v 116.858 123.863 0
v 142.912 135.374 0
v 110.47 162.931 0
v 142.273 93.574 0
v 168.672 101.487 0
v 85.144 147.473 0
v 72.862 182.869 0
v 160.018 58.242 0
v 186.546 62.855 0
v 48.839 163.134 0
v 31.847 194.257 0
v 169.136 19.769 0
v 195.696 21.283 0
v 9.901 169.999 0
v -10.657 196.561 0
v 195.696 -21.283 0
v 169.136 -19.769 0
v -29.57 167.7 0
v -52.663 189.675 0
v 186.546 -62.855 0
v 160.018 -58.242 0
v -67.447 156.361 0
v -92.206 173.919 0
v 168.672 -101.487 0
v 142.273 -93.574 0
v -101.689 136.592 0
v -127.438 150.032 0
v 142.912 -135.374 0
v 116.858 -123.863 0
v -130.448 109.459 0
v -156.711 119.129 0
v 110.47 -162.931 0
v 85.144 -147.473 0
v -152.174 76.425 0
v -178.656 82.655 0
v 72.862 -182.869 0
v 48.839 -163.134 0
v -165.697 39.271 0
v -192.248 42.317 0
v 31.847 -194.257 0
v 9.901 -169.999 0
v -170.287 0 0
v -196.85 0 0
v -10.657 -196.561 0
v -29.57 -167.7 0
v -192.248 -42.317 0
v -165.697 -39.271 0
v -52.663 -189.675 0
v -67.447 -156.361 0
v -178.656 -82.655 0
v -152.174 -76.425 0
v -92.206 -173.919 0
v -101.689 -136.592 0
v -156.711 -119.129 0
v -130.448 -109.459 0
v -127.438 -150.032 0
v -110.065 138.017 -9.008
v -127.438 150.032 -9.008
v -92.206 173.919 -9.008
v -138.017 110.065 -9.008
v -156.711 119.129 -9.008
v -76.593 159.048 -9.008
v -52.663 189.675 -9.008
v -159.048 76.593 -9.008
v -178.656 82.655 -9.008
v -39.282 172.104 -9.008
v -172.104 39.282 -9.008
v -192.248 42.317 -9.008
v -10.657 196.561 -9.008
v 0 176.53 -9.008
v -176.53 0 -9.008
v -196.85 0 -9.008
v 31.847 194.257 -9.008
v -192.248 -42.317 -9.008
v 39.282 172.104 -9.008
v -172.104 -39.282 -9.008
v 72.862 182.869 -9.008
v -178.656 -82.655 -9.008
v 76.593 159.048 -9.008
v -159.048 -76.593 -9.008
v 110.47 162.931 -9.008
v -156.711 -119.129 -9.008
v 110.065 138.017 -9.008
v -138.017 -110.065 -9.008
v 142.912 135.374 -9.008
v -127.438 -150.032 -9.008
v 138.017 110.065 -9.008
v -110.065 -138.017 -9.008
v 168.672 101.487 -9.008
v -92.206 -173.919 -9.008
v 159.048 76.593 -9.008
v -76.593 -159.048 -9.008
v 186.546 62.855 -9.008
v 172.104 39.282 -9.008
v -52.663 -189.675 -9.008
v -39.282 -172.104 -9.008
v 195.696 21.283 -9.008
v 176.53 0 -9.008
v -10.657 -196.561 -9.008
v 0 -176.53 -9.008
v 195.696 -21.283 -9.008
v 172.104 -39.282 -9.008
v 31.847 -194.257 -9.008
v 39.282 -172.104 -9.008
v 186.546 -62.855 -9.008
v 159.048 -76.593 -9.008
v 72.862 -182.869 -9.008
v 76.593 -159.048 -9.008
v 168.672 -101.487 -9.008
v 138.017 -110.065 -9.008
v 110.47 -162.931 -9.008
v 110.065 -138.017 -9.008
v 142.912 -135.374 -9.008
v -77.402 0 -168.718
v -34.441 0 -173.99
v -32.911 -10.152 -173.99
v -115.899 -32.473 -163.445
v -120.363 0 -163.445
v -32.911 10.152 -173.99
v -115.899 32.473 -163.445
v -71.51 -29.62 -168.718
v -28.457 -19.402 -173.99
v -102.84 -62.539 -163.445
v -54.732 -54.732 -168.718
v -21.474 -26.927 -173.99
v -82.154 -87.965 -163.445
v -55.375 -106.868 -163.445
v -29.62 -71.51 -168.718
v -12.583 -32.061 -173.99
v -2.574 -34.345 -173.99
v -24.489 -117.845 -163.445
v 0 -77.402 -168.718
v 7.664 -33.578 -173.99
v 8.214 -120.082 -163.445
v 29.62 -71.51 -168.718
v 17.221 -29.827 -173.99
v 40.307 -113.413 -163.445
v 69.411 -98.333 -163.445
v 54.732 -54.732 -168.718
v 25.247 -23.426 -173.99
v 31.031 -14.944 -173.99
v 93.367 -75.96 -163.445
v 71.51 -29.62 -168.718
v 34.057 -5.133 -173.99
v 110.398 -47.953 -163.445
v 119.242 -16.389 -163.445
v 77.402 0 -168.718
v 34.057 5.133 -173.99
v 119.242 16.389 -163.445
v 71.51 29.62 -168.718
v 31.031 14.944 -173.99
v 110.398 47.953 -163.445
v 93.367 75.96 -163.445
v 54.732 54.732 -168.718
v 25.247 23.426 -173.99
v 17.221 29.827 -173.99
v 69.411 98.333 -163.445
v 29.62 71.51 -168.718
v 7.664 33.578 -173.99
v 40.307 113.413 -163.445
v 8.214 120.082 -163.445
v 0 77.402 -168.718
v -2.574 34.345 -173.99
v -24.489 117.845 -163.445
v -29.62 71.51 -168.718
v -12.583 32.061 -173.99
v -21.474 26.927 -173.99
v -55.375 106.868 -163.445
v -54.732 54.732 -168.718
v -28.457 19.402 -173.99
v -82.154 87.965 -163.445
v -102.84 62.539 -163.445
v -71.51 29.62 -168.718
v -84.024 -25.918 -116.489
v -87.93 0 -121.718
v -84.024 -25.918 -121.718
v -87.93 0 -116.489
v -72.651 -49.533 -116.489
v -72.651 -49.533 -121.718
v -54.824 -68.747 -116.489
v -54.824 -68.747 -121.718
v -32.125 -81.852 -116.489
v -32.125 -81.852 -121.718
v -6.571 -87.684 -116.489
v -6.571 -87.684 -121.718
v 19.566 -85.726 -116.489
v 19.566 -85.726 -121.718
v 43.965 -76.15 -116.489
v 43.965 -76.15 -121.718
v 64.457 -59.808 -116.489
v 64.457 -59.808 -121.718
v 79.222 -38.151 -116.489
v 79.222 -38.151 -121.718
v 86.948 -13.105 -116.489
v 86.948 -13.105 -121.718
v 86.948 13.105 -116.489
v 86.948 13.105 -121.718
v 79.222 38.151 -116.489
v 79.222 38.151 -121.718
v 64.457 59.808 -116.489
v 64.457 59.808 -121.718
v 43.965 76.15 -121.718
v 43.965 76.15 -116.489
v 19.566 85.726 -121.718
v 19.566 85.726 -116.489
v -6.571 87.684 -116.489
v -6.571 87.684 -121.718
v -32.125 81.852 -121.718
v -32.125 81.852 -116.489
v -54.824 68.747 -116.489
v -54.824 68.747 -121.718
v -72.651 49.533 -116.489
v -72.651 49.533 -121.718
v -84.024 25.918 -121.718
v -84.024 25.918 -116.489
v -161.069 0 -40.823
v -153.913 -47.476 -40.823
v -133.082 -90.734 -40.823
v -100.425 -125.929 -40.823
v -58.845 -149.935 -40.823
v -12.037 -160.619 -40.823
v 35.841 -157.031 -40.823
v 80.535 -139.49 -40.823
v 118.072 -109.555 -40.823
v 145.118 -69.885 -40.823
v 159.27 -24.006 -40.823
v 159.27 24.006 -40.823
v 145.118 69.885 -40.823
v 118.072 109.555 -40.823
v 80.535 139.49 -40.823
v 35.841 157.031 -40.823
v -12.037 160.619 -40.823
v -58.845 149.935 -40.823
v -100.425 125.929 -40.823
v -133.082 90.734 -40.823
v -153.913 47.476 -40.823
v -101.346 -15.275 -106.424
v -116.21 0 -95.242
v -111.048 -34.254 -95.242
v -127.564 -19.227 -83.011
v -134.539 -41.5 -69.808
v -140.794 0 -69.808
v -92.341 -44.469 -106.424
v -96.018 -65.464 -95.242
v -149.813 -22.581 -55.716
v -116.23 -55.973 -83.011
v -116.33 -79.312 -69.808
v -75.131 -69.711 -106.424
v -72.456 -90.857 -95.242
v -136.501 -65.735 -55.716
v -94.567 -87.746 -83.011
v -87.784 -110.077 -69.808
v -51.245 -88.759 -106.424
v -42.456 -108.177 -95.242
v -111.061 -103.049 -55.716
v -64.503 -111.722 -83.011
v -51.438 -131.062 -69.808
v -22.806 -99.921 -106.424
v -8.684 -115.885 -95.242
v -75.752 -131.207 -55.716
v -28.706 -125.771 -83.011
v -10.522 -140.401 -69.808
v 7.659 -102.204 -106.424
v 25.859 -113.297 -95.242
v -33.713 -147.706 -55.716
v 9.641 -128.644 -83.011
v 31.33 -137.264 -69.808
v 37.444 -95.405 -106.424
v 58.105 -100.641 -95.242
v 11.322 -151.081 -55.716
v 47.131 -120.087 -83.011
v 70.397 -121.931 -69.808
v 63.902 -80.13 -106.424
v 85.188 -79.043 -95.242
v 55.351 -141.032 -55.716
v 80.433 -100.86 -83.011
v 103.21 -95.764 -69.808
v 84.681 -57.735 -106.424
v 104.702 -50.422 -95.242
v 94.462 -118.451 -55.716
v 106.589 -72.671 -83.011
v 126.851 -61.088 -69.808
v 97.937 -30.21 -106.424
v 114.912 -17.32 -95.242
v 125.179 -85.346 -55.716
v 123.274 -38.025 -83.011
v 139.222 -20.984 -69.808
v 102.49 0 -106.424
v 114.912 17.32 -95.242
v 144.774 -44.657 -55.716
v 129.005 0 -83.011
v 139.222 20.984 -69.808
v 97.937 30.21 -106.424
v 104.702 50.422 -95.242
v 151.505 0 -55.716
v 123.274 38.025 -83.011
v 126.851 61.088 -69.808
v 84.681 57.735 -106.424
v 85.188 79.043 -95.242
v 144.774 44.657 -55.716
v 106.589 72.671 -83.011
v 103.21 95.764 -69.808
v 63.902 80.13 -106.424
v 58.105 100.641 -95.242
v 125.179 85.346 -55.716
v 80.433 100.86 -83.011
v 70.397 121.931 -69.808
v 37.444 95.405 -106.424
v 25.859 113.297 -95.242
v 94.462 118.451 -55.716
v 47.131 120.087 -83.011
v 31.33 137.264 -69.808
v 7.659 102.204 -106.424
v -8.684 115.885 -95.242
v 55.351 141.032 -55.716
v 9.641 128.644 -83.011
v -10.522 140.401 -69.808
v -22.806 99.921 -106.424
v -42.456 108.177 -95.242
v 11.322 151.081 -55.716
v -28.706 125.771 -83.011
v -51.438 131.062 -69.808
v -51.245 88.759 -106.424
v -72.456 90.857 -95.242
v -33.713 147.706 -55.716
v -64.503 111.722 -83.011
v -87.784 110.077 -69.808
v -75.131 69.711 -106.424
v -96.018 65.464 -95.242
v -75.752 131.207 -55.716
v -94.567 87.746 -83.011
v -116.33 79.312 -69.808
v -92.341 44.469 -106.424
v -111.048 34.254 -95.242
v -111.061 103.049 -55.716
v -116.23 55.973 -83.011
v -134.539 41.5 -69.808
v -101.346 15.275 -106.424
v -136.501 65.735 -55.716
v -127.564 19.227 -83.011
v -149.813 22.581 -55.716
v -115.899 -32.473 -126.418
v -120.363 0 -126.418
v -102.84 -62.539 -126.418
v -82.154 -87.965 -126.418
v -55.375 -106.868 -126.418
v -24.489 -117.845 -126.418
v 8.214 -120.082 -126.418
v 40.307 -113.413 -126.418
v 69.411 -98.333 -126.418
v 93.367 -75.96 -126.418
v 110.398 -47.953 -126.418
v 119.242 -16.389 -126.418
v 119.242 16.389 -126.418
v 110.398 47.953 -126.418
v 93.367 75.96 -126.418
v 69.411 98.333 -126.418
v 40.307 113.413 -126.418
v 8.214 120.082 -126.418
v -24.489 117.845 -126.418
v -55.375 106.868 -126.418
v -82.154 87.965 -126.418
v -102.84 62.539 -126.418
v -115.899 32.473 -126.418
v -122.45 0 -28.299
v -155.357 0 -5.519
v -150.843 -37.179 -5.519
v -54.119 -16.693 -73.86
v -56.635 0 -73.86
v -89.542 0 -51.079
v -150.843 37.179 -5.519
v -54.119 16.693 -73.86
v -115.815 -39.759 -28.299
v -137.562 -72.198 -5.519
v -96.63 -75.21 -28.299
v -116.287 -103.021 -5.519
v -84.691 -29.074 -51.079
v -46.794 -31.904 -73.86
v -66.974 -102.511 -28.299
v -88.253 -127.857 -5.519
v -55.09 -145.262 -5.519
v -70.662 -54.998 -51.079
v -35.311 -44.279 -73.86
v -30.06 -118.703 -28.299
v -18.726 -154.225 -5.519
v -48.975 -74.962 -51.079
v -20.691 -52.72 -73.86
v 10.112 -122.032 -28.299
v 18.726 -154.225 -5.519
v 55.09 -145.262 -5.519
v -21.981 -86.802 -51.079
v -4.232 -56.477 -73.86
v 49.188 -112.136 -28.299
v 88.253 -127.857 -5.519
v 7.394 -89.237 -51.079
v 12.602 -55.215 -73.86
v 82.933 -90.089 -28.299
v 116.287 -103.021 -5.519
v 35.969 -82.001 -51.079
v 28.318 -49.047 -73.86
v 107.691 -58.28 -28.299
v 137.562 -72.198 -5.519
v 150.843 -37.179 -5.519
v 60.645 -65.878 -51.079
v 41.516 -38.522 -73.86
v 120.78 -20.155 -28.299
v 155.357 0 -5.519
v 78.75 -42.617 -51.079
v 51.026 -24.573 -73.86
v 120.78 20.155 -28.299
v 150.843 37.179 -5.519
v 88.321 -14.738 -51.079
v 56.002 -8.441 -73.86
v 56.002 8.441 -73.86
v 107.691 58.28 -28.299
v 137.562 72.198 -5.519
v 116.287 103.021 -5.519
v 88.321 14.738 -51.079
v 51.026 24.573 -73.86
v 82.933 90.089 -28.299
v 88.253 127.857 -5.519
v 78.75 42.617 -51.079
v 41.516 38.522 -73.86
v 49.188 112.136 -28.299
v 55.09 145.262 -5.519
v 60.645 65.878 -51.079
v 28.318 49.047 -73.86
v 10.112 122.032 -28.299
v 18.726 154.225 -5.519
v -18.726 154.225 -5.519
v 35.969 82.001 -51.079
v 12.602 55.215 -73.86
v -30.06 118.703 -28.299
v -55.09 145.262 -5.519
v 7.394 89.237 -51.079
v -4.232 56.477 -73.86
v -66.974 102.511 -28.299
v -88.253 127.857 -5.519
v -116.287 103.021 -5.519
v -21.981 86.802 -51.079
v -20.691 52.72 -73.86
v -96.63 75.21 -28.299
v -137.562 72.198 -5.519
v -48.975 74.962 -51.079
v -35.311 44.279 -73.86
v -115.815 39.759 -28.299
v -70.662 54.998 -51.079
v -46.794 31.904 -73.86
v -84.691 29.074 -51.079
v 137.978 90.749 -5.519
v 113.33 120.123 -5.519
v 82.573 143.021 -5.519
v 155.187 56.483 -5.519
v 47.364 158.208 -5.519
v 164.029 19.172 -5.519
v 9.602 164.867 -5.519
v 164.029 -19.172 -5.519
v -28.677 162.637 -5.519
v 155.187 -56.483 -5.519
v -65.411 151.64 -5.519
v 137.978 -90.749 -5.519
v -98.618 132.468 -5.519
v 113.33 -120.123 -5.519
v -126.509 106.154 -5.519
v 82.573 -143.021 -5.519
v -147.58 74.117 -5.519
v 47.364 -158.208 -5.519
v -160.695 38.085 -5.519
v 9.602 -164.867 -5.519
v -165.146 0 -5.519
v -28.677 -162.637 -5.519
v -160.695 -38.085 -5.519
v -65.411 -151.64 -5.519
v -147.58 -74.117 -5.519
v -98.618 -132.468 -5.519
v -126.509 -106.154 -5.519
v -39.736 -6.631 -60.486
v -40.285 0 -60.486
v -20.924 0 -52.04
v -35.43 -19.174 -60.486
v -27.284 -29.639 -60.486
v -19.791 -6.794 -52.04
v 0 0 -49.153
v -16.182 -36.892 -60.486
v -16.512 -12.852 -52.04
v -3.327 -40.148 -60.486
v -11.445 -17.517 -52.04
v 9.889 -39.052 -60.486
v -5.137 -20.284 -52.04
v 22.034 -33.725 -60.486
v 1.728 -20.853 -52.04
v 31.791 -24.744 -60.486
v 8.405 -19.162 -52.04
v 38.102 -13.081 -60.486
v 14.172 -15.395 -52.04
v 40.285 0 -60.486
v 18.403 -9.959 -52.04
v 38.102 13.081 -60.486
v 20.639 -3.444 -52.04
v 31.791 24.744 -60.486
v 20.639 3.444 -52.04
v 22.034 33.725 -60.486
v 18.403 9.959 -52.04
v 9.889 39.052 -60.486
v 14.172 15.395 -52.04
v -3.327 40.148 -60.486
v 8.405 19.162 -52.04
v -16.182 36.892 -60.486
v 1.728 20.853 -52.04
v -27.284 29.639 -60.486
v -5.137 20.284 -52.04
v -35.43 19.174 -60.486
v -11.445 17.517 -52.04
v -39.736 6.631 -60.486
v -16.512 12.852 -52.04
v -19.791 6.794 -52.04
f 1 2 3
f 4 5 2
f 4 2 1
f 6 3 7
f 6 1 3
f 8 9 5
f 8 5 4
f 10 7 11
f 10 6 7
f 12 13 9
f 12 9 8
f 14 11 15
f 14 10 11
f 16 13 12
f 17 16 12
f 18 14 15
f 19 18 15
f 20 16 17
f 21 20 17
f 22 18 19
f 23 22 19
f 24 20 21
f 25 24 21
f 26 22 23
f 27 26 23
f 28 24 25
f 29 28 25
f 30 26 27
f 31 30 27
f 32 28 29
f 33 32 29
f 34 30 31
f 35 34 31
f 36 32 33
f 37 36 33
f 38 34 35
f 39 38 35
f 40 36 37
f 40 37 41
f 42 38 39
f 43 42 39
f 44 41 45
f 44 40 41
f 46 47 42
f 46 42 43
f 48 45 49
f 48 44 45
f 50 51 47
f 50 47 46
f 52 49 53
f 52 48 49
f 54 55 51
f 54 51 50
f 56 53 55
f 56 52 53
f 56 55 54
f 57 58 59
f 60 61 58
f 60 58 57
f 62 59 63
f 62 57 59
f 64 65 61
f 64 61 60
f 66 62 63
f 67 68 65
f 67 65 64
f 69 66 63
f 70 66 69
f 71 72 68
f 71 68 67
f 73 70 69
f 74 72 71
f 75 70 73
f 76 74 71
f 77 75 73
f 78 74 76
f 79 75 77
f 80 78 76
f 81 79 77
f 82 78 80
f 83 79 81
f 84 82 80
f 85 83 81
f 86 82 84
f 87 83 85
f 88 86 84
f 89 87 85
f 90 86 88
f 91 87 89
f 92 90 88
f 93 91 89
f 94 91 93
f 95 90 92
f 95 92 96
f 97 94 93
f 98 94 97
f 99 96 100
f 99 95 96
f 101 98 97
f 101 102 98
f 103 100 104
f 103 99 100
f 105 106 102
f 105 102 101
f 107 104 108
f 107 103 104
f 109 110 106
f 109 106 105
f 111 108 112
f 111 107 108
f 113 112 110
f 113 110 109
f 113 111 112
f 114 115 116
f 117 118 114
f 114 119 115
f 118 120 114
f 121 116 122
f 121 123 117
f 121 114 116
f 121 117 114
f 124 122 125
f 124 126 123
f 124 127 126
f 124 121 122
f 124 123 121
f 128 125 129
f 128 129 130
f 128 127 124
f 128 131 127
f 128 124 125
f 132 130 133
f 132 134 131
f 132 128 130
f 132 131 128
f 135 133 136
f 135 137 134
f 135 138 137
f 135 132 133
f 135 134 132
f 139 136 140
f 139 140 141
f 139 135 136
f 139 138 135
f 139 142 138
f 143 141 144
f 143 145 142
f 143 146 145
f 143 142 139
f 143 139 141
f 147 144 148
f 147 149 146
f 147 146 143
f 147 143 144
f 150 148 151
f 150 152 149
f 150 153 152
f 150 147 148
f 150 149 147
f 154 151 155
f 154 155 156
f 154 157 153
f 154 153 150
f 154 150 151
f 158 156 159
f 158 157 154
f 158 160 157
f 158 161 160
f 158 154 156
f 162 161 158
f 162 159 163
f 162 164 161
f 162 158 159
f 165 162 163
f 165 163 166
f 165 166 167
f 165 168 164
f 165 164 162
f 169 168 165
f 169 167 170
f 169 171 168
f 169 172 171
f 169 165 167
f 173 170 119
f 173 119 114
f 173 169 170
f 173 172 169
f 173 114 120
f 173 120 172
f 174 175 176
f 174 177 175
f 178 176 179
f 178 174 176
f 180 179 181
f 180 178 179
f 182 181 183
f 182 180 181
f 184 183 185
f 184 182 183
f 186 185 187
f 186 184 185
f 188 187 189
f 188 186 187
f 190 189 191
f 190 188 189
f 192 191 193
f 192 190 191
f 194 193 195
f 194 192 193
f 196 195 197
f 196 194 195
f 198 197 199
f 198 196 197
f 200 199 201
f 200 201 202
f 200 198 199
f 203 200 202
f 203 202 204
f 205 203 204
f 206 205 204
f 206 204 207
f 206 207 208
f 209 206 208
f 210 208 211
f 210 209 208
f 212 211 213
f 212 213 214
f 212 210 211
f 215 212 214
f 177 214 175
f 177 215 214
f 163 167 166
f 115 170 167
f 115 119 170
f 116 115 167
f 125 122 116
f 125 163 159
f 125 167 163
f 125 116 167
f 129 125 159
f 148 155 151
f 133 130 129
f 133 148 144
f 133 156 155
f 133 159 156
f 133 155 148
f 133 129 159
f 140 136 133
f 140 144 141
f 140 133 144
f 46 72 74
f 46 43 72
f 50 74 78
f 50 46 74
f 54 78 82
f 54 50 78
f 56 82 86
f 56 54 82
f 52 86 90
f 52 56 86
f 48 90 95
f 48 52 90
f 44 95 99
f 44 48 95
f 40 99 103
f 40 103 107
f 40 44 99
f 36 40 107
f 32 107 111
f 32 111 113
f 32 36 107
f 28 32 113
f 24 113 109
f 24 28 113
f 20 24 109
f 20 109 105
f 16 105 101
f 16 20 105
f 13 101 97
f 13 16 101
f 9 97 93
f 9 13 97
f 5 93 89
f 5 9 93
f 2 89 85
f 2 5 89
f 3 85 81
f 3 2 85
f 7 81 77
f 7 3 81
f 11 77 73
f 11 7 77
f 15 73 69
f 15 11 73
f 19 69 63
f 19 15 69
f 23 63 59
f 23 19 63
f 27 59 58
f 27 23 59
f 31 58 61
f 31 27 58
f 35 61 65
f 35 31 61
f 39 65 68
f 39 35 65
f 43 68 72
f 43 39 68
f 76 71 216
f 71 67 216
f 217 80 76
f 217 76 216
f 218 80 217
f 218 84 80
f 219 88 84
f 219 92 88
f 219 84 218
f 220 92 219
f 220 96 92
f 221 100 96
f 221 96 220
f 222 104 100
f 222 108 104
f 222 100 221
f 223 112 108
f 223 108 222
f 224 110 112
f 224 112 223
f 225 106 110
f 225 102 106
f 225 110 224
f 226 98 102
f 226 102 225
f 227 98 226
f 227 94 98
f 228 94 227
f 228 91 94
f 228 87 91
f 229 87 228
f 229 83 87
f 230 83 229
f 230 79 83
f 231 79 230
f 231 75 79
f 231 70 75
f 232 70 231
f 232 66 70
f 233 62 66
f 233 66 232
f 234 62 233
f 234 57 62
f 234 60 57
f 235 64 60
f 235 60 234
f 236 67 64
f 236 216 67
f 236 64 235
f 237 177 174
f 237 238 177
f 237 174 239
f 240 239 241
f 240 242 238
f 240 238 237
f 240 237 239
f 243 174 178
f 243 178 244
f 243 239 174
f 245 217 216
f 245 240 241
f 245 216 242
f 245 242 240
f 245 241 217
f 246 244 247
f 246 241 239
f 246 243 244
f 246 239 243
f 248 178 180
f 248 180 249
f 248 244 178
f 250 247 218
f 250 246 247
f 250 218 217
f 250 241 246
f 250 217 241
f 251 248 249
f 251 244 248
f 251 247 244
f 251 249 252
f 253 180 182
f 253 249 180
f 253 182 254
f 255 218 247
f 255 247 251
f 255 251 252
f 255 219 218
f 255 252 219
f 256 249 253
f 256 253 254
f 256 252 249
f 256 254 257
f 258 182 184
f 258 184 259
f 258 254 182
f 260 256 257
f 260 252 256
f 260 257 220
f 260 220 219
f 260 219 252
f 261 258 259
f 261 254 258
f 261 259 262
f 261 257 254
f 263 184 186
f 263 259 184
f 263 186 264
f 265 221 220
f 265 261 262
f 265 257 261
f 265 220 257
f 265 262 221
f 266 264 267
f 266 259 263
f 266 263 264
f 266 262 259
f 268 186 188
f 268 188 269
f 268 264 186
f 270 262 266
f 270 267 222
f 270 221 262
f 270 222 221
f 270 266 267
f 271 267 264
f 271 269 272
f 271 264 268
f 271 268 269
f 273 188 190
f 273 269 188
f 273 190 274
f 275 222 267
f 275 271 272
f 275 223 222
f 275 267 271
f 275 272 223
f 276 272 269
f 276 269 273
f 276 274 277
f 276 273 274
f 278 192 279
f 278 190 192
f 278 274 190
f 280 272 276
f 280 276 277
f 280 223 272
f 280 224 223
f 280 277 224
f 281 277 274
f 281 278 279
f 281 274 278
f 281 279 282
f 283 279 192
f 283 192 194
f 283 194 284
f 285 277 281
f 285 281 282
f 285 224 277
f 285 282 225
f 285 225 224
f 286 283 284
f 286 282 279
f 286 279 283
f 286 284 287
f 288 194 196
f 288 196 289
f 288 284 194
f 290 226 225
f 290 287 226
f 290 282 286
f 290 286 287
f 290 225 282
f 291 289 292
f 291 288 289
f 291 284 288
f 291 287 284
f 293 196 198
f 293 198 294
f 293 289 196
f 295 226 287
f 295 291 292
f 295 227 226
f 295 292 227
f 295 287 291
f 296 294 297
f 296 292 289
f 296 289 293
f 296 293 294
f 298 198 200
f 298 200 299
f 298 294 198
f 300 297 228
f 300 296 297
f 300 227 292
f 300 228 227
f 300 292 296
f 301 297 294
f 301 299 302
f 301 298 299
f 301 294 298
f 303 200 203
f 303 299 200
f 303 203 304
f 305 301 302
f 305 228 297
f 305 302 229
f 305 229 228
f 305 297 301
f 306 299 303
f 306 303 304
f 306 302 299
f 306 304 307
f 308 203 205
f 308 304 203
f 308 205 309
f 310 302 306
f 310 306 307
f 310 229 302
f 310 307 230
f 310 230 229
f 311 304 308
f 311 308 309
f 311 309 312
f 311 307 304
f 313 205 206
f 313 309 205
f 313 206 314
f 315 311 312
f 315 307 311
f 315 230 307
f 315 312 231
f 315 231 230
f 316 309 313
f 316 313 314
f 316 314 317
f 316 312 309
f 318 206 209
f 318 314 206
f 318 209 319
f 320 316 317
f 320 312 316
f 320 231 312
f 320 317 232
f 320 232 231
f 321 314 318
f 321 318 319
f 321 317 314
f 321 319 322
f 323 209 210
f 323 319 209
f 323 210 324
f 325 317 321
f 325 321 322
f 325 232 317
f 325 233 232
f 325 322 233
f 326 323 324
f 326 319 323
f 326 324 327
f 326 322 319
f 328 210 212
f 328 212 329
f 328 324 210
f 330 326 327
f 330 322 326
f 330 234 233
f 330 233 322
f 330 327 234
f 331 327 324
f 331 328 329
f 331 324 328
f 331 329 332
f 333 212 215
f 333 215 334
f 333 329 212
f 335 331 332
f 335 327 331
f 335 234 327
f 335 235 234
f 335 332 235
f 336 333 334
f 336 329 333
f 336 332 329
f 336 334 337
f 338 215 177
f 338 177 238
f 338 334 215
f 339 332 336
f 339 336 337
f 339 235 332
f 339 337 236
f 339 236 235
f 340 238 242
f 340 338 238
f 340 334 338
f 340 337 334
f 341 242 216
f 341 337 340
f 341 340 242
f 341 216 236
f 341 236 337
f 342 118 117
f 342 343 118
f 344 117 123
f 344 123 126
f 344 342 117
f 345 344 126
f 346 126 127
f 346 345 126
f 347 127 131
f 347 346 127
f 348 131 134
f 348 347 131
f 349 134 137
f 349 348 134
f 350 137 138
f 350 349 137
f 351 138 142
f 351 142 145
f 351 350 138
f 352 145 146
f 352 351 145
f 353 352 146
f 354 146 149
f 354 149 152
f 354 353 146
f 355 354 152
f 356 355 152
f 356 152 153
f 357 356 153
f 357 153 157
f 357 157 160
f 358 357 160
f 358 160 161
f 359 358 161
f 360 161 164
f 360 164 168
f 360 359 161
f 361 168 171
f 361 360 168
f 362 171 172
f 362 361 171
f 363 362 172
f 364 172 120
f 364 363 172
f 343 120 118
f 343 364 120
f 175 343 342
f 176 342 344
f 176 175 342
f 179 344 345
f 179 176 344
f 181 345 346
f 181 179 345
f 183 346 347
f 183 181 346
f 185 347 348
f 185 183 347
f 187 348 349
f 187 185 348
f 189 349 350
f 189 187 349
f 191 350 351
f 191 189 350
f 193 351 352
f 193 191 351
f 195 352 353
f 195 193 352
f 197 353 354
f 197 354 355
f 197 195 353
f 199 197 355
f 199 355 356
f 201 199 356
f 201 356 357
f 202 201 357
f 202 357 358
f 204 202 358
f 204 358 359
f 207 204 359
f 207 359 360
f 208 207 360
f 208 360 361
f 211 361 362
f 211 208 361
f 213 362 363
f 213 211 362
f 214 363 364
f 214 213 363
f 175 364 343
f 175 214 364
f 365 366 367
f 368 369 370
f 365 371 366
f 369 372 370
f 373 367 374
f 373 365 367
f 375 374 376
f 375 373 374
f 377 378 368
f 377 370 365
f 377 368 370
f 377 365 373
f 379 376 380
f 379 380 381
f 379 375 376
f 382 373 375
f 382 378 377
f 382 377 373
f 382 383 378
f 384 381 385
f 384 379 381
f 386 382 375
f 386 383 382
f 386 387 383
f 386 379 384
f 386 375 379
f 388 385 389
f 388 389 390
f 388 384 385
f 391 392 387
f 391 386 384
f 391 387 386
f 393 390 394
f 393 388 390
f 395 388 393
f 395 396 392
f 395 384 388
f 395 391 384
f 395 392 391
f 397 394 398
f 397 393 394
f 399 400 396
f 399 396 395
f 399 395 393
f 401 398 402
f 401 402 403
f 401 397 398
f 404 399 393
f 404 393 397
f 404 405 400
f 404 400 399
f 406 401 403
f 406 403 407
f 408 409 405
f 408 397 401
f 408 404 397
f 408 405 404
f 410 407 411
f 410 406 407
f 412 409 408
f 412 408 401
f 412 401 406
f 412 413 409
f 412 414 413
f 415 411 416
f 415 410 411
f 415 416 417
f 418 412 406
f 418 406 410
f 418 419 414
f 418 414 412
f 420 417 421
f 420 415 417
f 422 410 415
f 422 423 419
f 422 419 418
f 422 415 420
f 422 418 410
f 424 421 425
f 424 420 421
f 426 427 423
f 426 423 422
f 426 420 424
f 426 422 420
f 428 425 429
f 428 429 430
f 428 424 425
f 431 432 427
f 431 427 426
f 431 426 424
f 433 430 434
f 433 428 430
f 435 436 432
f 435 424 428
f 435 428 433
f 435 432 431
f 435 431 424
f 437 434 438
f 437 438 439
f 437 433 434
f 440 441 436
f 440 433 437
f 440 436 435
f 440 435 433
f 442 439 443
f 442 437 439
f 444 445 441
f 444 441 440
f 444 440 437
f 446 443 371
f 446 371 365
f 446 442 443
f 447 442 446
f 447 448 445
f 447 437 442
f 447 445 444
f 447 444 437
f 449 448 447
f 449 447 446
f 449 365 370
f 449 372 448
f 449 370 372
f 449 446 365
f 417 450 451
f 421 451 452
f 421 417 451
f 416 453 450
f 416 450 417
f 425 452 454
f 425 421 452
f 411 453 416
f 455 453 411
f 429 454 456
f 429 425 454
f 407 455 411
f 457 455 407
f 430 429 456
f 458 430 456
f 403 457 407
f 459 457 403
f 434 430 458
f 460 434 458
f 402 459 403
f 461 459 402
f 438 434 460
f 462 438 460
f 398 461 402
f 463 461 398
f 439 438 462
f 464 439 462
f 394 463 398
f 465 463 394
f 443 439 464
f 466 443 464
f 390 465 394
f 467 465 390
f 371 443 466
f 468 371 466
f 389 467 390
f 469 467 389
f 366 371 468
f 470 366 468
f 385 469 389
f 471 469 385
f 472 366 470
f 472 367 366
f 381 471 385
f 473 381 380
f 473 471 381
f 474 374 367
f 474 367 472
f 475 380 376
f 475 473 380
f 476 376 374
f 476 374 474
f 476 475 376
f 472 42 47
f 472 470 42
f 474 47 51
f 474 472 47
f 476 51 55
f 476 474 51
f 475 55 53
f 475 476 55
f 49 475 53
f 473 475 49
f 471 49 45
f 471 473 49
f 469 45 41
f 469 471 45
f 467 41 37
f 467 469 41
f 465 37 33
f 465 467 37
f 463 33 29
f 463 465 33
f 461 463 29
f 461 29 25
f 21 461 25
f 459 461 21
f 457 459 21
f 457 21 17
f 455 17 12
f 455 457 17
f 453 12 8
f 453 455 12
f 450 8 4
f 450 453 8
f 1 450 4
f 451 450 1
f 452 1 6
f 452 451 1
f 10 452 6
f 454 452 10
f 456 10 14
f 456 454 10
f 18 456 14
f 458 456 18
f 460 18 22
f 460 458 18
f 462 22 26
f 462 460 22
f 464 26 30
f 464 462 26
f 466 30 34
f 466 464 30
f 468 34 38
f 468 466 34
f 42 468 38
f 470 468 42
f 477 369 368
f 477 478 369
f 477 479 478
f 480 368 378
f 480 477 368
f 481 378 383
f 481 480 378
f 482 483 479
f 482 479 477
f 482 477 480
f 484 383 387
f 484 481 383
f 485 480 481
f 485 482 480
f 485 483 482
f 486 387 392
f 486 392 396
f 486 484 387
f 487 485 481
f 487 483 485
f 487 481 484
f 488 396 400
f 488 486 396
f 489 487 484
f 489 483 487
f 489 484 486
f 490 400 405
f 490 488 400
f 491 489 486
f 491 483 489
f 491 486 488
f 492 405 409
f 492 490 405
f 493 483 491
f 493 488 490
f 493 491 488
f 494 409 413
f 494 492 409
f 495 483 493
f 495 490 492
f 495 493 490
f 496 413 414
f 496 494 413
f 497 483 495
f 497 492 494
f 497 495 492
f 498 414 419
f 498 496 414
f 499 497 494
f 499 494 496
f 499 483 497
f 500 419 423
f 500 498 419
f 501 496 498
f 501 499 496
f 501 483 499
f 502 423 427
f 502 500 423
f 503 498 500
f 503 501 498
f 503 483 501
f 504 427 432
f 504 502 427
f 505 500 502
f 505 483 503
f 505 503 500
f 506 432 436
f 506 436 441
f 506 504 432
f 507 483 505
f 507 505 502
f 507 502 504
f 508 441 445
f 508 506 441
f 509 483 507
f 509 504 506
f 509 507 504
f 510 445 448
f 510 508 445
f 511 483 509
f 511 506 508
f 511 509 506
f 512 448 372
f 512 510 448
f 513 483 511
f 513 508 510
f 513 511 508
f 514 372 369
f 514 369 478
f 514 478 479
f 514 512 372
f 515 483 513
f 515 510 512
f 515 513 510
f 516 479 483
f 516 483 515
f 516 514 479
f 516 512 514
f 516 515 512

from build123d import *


with BuildPart() as part:
    # Sketch1 → Revolve1 (revolve)
    with BuildSketch(Plane(origin=(0, 0, 0), x_dir=(1, 0, 0), z_dir=(0, 1, 0)), mode=Mode.PRIVATE) as revolve1_sk:
        with BuildLine():
            Line((0, 173.99), (34.441352467, 173.99))
            Line((34.441352467, 173.99), (120.362804335, 163.445094544))
            Line((120.362804335, 163.445094544), (120.362804335, 126.418045415))
            Line((120.362804335, 126.418045415), (87.930206626, 121.717541752))
            Line((87.930206626, 121.717541752), (87.930206626, 116.489255163))
            ThreePointArc((87.930206626, 116.489255163), (140.794360125, 69.808266343), (176.53, 9.007793606))
            Line((176.53, 9.007793606), (196.85, 9.007793606))
            Line((196.85, 9.007793606), (196.85, 0))
            Line((196.85, 0), (170.287454318, 0))
            Line((170.287454318, 0), (165.146134883, 5.519041131))
            Line((165.146134883, 5.519041131), (155.357244635, 5.519041131))
            Line((155.357244635, 5.519041131), (56.635000781, 73.859502497))
            ThreePointArc((56.635000781, 73.859502497), (30.894765948, 55.598294044), (0, 49.152763773))
            Line((0, 49.152763773), (0, 173.99))
        make_face()
    revolve(revolve1_sk.sketch.rotate(Axis((0, 0, -173.99), (0, 0, 1)), 180), axis=Axis((0, 0, -173.99), (0, 0, 1)))


solid = part.part
